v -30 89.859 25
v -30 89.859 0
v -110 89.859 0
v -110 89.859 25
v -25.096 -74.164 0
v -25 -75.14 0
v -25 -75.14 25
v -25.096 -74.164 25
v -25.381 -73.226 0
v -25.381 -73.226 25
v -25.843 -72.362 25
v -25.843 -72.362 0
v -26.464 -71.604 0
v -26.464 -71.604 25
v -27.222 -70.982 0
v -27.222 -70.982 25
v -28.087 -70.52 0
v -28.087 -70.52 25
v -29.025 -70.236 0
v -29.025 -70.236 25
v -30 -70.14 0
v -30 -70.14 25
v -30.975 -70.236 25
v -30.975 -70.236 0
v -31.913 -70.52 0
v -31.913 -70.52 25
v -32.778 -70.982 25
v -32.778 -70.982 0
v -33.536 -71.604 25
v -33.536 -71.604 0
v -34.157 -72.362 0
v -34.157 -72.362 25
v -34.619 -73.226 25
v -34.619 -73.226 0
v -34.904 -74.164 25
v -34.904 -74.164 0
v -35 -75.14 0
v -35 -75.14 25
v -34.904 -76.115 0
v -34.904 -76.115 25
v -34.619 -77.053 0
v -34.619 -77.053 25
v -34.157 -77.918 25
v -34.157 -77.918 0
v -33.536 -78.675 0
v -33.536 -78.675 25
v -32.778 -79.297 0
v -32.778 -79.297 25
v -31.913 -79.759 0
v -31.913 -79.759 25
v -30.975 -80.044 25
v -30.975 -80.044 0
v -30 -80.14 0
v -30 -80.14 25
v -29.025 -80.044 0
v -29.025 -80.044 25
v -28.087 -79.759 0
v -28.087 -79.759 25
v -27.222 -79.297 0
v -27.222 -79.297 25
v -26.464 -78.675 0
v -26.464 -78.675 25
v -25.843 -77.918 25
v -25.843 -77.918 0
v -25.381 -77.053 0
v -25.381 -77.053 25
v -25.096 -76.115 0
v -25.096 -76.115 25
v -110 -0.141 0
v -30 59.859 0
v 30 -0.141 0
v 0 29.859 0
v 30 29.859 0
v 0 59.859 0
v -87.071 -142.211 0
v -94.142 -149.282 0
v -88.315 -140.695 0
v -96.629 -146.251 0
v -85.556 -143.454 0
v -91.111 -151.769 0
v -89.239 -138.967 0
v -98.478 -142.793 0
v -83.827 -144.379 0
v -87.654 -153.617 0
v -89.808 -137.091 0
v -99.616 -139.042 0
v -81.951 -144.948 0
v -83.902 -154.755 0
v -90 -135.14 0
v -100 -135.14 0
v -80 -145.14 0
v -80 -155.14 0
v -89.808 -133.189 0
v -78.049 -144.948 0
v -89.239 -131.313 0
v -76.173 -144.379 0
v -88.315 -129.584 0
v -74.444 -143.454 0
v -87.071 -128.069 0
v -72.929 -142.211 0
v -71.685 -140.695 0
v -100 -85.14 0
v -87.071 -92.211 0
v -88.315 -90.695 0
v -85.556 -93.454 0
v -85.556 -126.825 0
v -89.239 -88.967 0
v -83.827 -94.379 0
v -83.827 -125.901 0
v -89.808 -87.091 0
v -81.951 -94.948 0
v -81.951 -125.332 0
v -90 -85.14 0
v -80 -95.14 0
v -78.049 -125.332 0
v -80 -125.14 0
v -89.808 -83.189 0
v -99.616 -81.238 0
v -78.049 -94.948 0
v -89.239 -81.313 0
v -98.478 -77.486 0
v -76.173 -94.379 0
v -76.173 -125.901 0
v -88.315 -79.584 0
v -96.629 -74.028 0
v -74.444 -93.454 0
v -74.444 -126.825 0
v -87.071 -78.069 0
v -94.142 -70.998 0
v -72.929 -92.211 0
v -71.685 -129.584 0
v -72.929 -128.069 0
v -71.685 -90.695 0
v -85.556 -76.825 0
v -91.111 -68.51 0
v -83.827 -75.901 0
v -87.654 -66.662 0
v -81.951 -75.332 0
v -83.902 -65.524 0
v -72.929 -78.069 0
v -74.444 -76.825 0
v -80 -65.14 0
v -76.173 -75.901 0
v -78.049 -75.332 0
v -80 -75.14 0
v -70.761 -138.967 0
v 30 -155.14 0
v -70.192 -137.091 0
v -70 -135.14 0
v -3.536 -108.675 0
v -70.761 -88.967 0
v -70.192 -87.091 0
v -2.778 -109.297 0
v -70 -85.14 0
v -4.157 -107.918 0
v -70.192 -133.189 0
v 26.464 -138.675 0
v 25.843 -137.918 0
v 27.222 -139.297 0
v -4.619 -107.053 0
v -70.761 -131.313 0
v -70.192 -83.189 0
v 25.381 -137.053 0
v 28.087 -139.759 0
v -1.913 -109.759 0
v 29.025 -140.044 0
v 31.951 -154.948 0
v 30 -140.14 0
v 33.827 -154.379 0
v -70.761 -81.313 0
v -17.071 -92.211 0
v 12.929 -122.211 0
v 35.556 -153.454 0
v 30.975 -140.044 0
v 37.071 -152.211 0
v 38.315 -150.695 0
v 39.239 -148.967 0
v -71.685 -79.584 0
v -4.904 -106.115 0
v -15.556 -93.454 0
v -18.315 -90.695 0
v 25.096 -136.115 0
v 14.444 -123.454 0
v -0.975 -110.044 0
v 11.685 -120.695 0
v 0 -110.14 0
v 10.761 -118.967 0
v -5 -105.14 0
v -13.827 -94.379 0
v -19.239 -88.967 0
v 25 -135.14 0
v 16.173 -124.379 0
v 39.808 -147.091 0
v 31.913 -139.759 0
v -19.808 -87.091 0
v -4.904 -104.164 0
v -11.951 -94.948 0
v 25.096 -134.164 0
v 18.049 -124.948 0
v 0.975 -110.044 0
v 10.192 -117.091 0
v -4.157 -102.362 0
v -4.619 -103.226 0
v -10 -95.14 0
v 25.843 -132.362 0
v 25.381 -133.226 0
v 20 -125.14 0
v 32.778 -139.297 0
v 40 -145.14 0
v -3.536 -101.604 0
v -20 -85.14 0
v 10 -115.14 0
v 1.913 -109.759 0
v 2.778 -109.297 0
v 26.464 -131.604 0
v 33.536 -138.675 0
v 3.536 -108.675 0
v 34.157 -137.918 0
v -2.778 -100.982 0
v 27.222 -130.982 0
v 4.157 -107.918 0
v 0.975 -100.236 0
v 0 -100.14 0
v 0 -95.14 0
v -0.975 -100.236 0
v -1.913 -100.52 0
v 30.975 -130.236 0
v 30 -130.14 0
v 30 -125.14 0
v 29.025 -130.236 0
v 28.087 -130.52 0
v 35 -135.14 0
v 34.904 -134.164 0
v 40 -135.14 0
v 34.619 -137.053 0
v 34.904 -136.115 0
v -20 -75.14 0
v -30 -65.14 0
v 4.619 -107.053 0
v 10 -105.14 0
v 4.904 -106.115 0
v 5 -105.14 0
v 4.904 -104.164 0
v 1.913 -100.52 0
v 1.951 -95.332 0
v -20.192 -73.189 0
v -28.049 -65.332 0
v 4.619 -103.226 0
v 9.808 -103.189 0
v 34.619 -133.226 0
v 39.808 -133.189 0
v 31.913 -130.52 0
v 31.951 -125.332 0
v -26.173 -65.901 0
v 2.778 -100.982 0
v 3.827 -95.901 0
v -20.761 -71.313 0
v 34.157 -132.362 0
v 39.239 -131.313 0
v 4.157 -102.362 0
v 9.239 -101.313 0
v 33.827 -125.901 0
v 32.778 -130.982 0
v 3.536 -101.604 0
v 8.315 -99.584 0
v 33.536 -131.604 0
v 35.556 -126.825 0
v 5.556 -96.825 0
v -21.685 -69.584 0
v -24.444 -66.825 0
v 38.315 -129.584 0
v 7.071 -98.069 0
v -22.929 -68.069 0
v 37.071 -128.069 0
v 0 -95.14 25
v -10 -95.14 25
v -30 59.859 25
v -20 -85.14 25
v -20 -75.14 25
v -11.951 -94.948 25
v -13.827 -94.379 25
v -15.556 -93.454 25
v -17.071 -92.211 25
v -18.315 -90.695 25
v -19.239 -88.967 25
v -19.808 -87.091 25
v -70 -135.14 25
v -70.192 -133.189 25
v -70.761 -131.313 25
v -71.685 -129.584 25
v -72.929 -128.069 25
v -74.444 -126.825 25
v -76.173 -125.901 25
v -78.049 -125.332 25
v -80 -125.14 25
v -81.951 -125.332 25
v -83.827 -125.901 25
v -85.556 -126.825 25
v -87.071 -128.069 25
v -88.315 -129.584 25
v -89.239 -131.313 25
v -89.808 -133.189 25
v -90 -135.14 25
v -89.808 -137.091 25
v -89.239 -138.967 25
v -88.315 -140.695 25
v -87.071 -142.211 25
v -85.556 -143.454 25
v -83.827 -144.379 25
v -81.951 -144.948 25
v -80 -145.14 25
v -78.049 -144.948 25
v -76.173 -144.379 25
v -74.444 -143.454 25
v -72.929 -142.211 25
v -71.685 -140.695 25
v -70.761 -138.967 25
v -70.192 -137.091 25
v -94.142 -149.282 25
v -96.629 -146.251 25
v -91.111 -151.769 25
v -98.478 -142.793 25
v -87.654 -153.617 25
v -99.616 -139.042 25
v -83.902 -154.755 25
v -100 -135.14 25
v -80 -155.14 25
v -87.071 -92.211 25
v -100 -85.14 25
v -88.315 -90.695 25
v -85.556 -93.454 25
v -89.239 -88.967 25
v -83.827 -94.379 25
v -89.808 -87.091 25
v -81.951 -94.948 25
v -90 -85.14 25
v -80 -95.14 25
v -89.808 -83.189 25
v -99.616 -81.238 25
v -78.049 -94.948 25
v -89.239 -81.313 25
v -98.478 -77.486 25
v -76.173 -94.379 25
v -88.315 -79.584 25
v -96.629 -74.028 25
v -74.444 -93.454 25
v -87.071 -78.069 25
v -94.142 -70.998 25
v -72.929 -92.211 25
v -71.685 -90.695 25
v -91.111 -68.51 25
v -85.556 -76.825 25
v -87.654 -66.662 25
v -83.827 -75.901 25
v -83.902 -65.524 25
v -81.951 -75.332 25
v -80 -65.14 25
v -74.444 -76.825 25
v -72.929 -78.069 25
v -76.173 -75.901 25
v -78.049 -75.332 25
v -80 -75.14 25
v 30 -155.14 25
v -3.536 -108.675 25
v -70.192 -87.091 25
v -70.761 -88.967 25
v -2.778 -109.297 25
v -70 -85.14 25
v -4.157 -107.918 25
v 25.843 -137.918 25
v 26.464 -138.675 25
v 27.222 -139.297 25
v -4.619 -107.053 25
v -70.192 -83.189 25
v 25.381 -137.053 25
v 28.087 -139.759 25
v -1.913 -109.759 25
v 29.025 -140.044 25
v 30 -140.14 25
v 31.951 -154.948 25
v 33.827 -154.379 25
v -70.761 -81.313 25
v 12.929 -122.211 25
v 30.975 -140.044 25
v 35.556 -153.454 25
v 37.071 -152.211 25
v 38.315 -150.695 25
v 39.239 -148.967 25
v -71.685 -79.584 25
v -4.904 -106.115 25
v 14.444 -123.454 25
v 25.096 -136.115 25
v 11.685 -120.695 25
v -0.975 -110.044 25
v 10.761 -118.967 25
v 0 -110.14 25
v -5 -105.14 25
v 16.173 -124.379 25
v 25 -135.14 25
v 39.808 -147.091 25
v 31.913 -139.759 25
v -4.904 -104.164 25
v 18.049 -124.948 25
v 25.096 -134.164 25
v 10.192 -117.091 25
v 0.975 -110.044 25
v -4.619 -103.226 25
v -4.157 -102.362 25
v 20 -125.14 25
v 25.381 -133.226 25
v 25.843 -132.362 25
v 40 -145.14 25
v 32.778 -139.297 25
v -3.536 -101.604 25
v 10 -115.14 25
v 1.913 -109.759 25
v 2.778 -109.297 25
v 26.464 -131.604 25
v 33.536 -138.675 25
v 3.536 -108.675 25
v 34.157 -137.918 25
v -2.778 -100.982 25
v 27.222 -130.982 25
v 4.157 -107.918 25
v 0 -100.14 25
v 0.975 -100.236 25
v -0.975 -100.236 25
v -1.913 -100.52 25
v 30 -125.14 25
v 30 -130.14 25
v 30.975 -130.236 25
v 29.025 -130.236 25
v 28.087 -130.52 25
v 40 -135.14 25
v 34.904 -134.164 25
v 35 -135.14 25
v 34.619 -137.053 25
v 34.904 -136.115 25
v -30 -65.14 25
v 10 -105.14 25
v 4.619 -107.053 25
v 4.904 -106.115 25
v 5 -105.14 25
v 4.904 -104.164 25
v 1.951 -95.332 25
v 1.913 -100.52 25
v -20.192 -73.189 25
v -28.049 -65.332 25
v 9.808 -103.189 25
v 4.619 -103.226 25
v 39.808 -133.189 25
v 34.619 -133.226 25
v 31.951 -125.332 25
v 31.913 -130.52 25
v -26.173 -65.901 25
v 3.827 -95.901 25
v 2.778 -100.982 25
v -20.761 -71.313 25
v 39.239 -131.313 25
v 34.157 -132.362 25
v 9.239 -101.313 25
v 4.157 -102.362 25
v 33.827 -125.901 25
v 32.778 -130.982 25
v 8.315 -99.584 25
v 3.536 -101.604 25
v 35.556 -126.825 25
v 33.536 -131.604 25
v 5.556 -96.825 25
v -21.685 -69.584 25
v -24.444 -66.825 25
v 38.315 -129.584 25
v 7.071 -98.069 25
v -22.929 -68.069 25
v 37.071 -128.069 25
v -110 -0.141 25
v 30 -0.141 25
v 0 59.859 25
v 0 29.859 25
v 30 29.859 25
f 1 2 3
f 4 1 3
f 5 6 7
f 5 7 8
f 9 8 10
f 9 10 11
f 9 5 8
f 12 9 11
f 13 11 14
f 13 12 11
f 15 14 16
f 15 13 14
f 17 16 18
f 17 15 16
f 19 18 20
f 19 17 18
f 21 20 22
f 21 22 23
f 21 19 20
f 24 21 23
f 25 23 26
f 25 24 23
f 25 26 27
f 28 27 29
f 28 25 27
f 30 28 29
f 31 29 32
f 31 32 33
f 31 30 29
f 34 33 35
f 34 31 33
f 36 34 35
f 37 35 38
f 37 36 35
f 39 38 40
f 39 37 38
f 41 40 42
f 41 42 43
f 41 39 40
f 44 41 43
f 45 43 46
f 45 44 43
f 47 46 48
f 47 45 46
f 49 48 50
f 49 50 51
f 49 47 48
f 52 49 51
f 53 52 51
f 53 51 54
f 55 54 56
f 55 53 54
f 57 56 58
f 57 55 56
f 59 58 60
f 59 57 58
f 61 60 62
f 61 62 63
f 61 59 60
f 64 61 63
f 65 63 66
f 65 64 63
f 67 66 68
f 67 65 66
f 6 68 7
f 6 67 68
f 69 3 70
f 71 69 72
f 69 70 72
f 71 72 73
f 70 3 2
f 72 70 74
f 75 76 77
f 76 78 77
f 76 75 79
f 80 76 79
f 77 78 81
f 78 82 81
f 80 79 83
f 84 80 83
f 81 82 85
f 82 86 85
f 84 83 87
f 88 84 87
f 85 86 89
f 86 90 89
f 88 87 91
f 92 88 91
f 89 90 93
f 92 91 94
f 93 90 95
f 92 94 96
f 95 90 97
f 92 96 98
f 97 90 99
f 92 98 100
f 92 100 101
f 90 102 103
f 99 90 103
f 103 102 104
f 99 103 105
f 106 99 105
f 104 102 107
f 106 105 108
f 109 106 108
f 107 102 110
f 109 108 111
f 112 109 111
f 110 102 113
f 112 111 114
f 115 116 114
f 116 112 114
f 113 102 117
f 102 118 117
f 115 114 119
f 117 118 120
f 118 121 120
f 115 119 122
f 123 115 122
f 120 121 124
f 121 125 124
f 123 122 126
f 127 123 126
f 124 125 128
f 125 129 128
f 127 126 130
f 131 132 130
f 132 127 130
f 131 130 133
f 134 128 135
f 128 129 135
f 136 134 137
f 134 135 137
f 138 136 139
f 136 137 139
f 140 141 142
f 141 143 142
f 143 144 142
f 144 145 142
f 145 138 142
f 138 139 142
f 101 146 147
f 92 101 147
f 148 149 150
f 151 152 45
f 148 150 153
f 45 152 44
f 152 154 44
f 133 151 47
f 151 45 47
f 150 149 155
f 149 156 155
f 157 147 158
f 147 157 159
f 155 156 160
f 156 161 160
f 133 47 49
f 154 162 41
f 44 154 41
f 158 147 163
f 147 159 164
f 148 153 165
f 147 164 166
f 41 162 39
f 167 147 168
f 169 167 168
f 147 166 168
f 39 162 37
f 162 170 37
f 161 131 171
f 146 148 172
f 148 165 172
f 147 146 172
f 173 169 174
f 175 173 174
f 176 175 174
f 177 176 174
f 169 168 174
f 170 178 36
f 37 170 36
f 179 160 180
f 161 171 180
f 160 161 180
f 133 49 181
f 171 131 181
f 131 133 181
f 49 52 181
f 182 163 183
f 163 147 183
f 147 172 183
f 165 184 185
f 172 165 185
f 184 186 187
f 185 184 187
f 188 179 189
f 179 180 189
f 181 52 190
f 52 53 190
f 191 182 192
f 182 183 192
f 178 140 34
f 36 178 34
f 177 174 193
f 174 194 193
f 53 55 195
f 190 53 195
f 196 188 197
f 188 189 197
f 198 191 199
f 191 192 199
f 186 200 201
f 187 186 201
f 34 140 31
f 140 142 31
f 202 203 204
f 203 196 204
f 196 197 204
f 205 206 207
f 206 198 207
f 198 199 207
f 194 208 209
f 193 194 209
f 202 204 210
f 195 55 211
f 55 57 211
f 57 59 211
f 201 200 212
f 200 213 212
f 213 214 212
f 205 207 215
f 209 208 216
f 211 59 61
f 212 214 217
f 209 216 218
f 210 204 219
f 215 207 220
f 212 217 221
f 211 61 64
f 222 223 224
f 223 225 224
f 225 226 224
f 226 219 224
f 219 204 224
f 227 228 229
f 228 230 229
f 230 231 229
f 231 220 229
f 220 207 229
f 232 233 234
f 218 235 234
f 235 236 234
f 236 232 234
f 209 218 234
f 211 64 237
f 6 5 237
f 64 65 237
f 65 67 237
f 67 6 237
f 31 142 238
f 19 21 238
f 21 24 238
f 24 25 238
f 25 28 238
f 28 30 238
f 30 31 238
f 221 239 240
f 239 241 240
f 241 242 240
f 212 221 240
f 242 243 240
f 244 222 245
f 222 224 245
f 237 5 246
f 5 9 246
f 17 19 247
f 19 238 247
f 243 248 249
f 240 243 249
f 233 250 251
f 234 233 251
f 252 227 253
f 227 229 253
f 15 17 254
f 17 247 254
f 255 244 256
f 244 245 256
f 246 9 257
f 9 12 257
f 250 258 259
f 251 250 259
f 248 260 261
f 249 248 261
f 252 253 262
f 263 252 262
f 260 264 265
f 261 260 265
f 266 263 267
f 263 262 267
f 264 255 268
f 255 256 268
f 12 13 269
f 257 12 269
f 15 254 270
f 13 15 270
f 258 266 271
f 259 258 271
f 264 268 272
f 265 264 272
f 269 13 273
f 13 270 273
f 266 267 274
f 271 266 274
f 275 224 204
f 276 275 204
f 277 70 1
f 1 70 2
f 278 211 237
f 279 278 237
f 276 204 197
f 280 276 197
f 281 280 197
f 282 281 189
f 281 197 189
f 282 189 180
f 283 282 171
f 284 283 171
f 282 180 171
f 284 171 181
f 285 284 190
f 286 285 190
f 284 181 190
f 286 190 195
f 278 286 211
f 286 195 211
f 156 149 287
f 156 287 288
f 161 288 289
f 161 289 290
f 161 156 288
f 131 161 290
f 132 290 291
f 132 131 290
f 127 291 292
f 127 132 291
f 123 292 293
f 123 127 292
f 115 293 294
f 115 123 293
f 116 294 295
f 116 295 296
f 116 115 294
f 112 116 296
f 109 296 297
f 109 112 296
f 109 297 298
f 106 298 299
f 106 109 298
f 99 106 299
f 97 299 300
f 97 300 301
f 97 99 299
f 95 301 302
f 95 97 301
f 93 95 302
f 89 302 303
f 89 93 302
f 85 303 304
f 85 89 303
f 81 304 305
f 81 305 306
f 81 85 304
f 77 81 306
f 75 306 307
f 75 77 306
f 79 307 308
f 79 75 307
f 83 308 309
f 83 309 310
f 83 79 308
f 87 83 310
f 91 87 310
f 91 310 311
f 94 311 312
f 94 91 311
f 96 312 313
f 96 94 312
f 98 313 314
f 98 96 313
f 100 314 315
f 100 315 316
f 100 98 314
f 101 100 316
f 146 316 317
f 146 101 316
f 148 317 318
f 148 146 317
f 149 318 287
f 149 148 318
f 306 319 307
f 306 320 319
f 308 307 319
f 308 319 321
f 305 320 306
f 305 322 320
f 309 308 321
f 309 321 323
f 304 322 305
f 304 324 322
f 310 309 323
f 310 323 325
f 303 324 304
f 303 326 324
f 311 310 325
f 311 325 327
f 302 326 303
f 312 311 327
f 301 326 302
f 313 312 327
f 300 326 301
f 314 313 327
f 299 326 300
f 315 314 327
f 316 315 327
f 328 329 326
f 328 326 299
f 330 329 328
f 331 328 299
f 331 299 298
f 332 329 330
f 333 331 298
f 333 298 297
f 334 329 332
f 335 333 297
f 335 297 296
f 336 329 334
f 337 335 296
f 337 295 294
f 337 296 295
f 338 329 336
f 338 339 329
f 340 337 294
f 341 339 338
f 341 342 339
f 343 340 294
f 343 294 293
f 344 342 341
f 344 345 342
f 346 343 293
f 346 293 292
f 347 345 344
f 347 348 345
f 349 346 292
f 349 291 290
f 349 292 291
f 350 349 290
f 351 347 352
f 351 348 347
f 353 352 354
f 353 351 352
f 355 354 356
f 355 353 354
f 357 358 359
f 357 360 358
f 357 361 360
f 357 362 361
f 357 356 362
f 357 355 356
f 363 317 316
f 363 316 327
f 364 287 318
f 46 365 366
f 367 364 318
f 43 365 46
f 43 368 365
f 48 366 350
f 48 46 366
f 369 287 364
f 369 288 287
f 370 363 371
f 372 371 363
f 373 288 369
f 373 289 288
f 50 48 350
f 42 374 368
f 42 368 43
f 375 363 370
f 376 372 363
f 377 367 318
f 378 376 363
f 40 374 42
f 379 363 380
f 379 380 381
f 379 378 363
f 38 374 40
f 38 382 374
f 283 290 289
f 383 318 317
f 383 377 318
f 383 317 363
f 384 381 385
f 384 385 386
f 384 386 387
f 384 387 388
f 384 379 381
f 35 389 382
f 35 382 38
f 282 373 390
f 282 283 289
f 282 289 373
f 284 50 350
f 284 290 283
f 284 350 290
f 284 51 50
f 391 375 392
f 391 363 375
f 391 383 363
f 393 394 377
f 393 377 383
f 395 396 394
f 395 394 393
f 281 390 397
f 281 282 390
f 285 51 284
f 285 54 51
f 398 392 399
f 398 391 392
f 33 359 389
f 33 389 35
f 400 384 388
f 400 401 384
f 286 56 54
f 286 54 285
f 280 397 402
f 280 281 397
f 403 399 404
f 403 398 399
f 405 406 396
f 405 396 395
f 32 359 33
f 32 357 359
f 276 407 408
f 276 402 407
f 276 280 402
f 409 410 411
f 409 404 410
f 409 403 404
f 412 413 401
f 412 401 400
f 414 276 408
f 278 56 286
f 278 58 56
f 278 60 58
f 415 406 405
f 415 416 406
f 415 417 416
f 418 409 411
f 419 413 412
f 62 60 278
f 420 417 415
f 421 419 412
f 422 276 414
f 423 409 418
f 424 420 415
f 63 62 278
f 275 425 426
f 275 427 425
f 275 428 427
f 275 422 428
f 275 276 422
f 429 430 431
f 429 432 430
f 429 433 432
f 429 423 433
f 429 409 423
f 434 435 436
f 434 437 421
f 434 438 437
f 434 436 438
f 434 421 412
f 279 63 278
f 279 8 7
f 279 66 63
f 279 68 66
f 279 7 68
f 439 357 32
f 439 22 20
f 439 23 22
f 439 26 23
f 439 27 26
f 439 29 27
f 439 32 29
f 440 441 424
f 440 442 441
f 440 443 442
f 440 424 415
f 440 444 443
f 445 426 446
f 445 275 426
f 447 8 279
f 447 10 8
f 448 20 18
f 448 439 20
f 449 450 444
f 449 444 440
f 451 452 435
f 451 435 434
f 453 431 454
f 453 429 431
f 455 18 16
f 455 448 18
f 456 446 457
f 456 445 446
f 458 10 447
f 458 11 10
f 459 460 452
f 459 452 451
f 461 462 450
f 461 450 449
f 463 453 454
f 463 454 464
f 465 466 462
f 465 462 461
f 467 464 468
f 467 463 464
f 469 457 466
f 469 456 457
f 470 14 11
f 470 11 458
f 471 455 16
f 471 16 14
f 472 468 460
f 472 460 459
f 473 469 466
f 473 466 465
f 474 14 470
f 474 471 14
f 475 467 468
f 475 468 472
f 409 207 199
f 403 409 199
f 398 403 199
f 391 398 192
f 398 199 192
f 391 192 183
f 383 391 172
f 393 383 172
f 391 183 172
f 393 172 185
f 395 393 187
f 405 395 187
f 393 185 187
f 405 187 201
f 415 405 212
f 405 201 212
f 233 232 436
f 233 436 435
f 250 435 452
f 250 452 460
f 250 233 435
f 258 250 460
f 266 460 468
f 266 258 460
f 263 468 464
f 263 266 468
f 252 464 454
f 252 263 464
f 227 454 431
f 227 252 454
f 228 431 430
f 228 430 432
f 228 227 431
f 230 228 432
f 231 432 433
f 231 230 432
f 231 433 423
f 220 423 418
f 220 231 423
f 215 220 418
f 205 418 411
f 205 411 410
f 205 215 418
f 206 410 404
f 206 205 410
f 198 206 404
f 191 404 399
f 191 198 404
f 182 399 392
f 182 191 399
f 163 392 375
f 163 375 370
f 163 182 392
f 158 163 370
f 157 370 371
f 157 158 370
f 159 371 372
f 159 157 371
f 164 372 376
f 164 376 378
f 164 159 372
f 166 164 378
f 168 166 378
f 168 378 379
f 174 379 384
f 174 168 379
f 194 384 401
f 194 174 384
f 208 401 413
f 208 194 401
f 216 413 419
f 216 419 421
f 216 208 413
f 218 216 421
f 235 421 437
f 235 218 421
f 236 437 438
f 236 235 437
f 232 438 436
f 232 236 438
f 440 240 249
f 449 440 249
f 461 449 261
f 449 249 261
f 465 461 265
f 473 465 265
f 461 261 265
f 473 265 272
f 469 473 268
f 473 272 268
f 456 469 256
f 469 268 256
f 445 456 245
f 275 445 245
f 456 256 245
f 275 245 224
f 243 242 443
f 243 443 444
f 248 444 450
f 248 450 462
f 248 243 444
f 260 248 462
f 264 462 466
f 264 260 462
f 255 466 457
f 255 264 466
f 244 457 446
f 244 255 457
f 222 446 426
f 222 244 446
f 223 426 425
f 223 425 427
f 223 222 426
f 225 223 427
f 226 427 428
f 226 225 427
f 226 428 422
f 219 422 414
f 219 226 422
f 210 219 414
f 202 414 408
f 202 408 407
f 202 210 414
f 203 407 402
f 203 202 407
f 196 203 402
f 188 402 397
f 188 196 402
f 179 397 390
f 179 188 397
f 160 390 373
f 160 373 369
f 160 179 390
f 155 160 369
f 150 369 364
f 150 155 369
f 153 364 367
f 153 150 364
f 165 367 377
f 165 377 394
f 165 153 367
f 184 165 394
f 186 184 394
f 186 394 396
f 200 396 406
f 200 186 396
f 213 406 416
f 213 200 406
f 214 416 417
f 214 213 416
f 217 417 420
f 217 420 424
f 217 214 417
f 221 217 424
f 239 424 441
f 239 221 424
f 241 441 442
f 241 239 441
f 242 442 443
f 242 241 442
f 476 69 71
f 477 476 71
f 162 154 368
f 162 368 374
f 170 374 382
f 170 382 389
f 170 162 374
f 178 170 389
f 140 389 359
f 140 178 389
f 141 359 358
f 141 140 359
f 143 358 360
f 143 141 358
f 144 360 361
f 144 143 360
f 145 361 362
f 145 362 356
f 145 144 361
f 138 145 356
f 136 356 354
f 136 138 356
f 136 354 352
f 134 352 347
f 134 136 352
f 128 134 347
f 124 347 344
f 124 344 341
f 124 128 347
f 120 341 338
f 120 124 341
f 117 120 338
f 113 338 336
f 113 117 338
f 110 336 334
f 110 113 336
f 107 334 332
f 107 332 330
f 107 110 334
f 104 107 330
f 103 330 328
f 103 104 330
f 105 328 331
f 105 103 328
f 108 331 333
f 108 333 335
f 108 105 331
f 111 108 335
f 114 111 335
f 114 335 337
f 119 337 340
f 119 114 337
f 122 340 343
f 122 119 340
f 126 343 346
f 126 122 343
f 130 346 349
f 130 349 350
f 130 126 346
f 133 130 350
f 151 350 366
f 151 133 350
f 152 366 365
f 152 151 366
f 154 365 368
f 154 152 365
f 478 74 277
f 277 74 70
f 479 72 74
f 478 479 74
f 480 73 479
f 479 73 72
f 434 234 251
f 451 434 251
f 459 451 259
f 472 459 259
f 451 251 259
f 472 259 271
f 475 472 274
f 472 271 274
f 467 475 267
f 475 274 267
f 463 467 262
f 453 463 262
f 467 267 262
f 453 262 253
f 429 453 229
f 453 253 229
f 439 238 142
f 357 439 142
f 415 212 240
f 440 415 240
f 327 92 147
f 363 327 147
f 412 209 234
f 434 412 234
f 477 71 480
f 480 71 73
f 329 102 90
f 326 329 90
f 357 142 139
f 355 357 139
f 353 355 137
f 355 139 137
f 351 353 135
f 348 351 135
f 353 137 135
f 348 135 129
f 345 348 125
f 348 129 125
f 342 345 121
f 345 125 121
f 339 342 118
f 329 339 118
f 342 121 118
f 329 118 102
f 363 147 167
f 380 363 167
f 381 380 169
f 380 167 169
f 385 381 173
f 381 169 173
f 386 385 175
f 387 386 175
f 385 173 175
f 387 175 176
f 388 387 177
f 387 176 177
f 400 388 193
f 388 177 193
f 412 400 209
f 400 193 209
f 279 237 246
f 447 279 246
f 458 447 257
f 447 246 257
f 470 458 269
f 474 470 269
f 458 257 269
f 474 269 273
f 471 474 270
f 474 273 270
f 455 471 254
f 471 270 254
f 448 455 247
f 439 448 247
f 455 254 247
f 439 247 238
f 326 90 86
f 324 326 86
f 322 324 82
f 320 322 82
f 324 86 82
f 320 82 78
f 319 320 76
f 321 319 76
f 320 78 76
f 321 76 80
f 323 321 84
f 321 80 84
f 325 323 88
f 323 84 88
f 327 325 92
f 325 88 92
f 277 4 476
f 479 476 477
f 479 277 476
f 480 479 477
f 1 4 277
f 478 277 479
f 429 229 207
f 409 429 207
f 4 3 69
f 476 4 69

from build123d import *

# Parameters (mm, degrees)
F0_R     = 10
F0_R_2   = 5
F1_DEPTH = 25


with BuildPart() as f1:
    # F0 (on Top) → F1 (new body)
    with BuildSketch(Plane.XY):
        Polygon((-30, 89.858828), (-110, 89.858828), (-110, -0.141172), (30, -0.141172), (30, 29.858828), (0, 29.858828), (0, 59.858828), (-30, 59.858828), align=None)
        with BuildLine():
            Line((-80, -155.13972), (30, -155.13972))
            ThreePointArc((30, -155.13972), (37.071068, -152.210788), (40, -145.13972))
            Line((40, -145.13972), (40, -135.13972))
            ThreePointArc((40, -135.13972), (37.071068, -128.068652), (30, -125.13972))
            Line((30, -125.13972), (20, -125.13972))
            ThreePointArc((20, -125.13972), (12.928932, -122.210788), (10, -115.13972))
            Line((10, -115.13972), (10, -105.13972))
            ThreePointArc((10, -105.13972), (7.071068, -98.068652), (0, -95.13972))
            Line((0, -95.13972), (-10, -95.13972))
            ThreePointArc((-10, -95.13972), (-17.071068, -92.210788), (-20, -85.13972))
            Line((-20, -85.13972), (-20, -75.13972))
            ThreePointArc((-20, -75.13972), (-22.928932, -68.068652), (-30, -65.13972))
            Line((-30, -65.13972), (-80, -65.13972))
            ThreePointArc((-80, -65.13972), (-94.142136, -70.997584), (-100, -85.13972))
            Line((-100, -85.13972), (-100, -135.13972))
            ThreePointArc((-100, -135.13972), (-94.142136, -149.281855), (-80, -155.13972))
        make_face()
        with Locations((-80, -135.13972)):
            Circle(F0_R, mode=Mode.SUBTRACT)
        with Locations((-80, -85.13972)):
            Circle(F0_R, mode=Mode.SUBTRACT)
        with Locations((0, -105.13972)):
            Circle(F0_R_2, mode=Mode.SUBTRACT)
        with Locations((30, -135.13972)):
            Circle(F0_R_2, mode=Mode.SUBTRACT)
        with Locations((-30, -75.13972)):
            Circle(F0_R_2, mode=Mode.SUBTRACT)
    extrude(amount=F1_DEPTH)


solid = f1.part
